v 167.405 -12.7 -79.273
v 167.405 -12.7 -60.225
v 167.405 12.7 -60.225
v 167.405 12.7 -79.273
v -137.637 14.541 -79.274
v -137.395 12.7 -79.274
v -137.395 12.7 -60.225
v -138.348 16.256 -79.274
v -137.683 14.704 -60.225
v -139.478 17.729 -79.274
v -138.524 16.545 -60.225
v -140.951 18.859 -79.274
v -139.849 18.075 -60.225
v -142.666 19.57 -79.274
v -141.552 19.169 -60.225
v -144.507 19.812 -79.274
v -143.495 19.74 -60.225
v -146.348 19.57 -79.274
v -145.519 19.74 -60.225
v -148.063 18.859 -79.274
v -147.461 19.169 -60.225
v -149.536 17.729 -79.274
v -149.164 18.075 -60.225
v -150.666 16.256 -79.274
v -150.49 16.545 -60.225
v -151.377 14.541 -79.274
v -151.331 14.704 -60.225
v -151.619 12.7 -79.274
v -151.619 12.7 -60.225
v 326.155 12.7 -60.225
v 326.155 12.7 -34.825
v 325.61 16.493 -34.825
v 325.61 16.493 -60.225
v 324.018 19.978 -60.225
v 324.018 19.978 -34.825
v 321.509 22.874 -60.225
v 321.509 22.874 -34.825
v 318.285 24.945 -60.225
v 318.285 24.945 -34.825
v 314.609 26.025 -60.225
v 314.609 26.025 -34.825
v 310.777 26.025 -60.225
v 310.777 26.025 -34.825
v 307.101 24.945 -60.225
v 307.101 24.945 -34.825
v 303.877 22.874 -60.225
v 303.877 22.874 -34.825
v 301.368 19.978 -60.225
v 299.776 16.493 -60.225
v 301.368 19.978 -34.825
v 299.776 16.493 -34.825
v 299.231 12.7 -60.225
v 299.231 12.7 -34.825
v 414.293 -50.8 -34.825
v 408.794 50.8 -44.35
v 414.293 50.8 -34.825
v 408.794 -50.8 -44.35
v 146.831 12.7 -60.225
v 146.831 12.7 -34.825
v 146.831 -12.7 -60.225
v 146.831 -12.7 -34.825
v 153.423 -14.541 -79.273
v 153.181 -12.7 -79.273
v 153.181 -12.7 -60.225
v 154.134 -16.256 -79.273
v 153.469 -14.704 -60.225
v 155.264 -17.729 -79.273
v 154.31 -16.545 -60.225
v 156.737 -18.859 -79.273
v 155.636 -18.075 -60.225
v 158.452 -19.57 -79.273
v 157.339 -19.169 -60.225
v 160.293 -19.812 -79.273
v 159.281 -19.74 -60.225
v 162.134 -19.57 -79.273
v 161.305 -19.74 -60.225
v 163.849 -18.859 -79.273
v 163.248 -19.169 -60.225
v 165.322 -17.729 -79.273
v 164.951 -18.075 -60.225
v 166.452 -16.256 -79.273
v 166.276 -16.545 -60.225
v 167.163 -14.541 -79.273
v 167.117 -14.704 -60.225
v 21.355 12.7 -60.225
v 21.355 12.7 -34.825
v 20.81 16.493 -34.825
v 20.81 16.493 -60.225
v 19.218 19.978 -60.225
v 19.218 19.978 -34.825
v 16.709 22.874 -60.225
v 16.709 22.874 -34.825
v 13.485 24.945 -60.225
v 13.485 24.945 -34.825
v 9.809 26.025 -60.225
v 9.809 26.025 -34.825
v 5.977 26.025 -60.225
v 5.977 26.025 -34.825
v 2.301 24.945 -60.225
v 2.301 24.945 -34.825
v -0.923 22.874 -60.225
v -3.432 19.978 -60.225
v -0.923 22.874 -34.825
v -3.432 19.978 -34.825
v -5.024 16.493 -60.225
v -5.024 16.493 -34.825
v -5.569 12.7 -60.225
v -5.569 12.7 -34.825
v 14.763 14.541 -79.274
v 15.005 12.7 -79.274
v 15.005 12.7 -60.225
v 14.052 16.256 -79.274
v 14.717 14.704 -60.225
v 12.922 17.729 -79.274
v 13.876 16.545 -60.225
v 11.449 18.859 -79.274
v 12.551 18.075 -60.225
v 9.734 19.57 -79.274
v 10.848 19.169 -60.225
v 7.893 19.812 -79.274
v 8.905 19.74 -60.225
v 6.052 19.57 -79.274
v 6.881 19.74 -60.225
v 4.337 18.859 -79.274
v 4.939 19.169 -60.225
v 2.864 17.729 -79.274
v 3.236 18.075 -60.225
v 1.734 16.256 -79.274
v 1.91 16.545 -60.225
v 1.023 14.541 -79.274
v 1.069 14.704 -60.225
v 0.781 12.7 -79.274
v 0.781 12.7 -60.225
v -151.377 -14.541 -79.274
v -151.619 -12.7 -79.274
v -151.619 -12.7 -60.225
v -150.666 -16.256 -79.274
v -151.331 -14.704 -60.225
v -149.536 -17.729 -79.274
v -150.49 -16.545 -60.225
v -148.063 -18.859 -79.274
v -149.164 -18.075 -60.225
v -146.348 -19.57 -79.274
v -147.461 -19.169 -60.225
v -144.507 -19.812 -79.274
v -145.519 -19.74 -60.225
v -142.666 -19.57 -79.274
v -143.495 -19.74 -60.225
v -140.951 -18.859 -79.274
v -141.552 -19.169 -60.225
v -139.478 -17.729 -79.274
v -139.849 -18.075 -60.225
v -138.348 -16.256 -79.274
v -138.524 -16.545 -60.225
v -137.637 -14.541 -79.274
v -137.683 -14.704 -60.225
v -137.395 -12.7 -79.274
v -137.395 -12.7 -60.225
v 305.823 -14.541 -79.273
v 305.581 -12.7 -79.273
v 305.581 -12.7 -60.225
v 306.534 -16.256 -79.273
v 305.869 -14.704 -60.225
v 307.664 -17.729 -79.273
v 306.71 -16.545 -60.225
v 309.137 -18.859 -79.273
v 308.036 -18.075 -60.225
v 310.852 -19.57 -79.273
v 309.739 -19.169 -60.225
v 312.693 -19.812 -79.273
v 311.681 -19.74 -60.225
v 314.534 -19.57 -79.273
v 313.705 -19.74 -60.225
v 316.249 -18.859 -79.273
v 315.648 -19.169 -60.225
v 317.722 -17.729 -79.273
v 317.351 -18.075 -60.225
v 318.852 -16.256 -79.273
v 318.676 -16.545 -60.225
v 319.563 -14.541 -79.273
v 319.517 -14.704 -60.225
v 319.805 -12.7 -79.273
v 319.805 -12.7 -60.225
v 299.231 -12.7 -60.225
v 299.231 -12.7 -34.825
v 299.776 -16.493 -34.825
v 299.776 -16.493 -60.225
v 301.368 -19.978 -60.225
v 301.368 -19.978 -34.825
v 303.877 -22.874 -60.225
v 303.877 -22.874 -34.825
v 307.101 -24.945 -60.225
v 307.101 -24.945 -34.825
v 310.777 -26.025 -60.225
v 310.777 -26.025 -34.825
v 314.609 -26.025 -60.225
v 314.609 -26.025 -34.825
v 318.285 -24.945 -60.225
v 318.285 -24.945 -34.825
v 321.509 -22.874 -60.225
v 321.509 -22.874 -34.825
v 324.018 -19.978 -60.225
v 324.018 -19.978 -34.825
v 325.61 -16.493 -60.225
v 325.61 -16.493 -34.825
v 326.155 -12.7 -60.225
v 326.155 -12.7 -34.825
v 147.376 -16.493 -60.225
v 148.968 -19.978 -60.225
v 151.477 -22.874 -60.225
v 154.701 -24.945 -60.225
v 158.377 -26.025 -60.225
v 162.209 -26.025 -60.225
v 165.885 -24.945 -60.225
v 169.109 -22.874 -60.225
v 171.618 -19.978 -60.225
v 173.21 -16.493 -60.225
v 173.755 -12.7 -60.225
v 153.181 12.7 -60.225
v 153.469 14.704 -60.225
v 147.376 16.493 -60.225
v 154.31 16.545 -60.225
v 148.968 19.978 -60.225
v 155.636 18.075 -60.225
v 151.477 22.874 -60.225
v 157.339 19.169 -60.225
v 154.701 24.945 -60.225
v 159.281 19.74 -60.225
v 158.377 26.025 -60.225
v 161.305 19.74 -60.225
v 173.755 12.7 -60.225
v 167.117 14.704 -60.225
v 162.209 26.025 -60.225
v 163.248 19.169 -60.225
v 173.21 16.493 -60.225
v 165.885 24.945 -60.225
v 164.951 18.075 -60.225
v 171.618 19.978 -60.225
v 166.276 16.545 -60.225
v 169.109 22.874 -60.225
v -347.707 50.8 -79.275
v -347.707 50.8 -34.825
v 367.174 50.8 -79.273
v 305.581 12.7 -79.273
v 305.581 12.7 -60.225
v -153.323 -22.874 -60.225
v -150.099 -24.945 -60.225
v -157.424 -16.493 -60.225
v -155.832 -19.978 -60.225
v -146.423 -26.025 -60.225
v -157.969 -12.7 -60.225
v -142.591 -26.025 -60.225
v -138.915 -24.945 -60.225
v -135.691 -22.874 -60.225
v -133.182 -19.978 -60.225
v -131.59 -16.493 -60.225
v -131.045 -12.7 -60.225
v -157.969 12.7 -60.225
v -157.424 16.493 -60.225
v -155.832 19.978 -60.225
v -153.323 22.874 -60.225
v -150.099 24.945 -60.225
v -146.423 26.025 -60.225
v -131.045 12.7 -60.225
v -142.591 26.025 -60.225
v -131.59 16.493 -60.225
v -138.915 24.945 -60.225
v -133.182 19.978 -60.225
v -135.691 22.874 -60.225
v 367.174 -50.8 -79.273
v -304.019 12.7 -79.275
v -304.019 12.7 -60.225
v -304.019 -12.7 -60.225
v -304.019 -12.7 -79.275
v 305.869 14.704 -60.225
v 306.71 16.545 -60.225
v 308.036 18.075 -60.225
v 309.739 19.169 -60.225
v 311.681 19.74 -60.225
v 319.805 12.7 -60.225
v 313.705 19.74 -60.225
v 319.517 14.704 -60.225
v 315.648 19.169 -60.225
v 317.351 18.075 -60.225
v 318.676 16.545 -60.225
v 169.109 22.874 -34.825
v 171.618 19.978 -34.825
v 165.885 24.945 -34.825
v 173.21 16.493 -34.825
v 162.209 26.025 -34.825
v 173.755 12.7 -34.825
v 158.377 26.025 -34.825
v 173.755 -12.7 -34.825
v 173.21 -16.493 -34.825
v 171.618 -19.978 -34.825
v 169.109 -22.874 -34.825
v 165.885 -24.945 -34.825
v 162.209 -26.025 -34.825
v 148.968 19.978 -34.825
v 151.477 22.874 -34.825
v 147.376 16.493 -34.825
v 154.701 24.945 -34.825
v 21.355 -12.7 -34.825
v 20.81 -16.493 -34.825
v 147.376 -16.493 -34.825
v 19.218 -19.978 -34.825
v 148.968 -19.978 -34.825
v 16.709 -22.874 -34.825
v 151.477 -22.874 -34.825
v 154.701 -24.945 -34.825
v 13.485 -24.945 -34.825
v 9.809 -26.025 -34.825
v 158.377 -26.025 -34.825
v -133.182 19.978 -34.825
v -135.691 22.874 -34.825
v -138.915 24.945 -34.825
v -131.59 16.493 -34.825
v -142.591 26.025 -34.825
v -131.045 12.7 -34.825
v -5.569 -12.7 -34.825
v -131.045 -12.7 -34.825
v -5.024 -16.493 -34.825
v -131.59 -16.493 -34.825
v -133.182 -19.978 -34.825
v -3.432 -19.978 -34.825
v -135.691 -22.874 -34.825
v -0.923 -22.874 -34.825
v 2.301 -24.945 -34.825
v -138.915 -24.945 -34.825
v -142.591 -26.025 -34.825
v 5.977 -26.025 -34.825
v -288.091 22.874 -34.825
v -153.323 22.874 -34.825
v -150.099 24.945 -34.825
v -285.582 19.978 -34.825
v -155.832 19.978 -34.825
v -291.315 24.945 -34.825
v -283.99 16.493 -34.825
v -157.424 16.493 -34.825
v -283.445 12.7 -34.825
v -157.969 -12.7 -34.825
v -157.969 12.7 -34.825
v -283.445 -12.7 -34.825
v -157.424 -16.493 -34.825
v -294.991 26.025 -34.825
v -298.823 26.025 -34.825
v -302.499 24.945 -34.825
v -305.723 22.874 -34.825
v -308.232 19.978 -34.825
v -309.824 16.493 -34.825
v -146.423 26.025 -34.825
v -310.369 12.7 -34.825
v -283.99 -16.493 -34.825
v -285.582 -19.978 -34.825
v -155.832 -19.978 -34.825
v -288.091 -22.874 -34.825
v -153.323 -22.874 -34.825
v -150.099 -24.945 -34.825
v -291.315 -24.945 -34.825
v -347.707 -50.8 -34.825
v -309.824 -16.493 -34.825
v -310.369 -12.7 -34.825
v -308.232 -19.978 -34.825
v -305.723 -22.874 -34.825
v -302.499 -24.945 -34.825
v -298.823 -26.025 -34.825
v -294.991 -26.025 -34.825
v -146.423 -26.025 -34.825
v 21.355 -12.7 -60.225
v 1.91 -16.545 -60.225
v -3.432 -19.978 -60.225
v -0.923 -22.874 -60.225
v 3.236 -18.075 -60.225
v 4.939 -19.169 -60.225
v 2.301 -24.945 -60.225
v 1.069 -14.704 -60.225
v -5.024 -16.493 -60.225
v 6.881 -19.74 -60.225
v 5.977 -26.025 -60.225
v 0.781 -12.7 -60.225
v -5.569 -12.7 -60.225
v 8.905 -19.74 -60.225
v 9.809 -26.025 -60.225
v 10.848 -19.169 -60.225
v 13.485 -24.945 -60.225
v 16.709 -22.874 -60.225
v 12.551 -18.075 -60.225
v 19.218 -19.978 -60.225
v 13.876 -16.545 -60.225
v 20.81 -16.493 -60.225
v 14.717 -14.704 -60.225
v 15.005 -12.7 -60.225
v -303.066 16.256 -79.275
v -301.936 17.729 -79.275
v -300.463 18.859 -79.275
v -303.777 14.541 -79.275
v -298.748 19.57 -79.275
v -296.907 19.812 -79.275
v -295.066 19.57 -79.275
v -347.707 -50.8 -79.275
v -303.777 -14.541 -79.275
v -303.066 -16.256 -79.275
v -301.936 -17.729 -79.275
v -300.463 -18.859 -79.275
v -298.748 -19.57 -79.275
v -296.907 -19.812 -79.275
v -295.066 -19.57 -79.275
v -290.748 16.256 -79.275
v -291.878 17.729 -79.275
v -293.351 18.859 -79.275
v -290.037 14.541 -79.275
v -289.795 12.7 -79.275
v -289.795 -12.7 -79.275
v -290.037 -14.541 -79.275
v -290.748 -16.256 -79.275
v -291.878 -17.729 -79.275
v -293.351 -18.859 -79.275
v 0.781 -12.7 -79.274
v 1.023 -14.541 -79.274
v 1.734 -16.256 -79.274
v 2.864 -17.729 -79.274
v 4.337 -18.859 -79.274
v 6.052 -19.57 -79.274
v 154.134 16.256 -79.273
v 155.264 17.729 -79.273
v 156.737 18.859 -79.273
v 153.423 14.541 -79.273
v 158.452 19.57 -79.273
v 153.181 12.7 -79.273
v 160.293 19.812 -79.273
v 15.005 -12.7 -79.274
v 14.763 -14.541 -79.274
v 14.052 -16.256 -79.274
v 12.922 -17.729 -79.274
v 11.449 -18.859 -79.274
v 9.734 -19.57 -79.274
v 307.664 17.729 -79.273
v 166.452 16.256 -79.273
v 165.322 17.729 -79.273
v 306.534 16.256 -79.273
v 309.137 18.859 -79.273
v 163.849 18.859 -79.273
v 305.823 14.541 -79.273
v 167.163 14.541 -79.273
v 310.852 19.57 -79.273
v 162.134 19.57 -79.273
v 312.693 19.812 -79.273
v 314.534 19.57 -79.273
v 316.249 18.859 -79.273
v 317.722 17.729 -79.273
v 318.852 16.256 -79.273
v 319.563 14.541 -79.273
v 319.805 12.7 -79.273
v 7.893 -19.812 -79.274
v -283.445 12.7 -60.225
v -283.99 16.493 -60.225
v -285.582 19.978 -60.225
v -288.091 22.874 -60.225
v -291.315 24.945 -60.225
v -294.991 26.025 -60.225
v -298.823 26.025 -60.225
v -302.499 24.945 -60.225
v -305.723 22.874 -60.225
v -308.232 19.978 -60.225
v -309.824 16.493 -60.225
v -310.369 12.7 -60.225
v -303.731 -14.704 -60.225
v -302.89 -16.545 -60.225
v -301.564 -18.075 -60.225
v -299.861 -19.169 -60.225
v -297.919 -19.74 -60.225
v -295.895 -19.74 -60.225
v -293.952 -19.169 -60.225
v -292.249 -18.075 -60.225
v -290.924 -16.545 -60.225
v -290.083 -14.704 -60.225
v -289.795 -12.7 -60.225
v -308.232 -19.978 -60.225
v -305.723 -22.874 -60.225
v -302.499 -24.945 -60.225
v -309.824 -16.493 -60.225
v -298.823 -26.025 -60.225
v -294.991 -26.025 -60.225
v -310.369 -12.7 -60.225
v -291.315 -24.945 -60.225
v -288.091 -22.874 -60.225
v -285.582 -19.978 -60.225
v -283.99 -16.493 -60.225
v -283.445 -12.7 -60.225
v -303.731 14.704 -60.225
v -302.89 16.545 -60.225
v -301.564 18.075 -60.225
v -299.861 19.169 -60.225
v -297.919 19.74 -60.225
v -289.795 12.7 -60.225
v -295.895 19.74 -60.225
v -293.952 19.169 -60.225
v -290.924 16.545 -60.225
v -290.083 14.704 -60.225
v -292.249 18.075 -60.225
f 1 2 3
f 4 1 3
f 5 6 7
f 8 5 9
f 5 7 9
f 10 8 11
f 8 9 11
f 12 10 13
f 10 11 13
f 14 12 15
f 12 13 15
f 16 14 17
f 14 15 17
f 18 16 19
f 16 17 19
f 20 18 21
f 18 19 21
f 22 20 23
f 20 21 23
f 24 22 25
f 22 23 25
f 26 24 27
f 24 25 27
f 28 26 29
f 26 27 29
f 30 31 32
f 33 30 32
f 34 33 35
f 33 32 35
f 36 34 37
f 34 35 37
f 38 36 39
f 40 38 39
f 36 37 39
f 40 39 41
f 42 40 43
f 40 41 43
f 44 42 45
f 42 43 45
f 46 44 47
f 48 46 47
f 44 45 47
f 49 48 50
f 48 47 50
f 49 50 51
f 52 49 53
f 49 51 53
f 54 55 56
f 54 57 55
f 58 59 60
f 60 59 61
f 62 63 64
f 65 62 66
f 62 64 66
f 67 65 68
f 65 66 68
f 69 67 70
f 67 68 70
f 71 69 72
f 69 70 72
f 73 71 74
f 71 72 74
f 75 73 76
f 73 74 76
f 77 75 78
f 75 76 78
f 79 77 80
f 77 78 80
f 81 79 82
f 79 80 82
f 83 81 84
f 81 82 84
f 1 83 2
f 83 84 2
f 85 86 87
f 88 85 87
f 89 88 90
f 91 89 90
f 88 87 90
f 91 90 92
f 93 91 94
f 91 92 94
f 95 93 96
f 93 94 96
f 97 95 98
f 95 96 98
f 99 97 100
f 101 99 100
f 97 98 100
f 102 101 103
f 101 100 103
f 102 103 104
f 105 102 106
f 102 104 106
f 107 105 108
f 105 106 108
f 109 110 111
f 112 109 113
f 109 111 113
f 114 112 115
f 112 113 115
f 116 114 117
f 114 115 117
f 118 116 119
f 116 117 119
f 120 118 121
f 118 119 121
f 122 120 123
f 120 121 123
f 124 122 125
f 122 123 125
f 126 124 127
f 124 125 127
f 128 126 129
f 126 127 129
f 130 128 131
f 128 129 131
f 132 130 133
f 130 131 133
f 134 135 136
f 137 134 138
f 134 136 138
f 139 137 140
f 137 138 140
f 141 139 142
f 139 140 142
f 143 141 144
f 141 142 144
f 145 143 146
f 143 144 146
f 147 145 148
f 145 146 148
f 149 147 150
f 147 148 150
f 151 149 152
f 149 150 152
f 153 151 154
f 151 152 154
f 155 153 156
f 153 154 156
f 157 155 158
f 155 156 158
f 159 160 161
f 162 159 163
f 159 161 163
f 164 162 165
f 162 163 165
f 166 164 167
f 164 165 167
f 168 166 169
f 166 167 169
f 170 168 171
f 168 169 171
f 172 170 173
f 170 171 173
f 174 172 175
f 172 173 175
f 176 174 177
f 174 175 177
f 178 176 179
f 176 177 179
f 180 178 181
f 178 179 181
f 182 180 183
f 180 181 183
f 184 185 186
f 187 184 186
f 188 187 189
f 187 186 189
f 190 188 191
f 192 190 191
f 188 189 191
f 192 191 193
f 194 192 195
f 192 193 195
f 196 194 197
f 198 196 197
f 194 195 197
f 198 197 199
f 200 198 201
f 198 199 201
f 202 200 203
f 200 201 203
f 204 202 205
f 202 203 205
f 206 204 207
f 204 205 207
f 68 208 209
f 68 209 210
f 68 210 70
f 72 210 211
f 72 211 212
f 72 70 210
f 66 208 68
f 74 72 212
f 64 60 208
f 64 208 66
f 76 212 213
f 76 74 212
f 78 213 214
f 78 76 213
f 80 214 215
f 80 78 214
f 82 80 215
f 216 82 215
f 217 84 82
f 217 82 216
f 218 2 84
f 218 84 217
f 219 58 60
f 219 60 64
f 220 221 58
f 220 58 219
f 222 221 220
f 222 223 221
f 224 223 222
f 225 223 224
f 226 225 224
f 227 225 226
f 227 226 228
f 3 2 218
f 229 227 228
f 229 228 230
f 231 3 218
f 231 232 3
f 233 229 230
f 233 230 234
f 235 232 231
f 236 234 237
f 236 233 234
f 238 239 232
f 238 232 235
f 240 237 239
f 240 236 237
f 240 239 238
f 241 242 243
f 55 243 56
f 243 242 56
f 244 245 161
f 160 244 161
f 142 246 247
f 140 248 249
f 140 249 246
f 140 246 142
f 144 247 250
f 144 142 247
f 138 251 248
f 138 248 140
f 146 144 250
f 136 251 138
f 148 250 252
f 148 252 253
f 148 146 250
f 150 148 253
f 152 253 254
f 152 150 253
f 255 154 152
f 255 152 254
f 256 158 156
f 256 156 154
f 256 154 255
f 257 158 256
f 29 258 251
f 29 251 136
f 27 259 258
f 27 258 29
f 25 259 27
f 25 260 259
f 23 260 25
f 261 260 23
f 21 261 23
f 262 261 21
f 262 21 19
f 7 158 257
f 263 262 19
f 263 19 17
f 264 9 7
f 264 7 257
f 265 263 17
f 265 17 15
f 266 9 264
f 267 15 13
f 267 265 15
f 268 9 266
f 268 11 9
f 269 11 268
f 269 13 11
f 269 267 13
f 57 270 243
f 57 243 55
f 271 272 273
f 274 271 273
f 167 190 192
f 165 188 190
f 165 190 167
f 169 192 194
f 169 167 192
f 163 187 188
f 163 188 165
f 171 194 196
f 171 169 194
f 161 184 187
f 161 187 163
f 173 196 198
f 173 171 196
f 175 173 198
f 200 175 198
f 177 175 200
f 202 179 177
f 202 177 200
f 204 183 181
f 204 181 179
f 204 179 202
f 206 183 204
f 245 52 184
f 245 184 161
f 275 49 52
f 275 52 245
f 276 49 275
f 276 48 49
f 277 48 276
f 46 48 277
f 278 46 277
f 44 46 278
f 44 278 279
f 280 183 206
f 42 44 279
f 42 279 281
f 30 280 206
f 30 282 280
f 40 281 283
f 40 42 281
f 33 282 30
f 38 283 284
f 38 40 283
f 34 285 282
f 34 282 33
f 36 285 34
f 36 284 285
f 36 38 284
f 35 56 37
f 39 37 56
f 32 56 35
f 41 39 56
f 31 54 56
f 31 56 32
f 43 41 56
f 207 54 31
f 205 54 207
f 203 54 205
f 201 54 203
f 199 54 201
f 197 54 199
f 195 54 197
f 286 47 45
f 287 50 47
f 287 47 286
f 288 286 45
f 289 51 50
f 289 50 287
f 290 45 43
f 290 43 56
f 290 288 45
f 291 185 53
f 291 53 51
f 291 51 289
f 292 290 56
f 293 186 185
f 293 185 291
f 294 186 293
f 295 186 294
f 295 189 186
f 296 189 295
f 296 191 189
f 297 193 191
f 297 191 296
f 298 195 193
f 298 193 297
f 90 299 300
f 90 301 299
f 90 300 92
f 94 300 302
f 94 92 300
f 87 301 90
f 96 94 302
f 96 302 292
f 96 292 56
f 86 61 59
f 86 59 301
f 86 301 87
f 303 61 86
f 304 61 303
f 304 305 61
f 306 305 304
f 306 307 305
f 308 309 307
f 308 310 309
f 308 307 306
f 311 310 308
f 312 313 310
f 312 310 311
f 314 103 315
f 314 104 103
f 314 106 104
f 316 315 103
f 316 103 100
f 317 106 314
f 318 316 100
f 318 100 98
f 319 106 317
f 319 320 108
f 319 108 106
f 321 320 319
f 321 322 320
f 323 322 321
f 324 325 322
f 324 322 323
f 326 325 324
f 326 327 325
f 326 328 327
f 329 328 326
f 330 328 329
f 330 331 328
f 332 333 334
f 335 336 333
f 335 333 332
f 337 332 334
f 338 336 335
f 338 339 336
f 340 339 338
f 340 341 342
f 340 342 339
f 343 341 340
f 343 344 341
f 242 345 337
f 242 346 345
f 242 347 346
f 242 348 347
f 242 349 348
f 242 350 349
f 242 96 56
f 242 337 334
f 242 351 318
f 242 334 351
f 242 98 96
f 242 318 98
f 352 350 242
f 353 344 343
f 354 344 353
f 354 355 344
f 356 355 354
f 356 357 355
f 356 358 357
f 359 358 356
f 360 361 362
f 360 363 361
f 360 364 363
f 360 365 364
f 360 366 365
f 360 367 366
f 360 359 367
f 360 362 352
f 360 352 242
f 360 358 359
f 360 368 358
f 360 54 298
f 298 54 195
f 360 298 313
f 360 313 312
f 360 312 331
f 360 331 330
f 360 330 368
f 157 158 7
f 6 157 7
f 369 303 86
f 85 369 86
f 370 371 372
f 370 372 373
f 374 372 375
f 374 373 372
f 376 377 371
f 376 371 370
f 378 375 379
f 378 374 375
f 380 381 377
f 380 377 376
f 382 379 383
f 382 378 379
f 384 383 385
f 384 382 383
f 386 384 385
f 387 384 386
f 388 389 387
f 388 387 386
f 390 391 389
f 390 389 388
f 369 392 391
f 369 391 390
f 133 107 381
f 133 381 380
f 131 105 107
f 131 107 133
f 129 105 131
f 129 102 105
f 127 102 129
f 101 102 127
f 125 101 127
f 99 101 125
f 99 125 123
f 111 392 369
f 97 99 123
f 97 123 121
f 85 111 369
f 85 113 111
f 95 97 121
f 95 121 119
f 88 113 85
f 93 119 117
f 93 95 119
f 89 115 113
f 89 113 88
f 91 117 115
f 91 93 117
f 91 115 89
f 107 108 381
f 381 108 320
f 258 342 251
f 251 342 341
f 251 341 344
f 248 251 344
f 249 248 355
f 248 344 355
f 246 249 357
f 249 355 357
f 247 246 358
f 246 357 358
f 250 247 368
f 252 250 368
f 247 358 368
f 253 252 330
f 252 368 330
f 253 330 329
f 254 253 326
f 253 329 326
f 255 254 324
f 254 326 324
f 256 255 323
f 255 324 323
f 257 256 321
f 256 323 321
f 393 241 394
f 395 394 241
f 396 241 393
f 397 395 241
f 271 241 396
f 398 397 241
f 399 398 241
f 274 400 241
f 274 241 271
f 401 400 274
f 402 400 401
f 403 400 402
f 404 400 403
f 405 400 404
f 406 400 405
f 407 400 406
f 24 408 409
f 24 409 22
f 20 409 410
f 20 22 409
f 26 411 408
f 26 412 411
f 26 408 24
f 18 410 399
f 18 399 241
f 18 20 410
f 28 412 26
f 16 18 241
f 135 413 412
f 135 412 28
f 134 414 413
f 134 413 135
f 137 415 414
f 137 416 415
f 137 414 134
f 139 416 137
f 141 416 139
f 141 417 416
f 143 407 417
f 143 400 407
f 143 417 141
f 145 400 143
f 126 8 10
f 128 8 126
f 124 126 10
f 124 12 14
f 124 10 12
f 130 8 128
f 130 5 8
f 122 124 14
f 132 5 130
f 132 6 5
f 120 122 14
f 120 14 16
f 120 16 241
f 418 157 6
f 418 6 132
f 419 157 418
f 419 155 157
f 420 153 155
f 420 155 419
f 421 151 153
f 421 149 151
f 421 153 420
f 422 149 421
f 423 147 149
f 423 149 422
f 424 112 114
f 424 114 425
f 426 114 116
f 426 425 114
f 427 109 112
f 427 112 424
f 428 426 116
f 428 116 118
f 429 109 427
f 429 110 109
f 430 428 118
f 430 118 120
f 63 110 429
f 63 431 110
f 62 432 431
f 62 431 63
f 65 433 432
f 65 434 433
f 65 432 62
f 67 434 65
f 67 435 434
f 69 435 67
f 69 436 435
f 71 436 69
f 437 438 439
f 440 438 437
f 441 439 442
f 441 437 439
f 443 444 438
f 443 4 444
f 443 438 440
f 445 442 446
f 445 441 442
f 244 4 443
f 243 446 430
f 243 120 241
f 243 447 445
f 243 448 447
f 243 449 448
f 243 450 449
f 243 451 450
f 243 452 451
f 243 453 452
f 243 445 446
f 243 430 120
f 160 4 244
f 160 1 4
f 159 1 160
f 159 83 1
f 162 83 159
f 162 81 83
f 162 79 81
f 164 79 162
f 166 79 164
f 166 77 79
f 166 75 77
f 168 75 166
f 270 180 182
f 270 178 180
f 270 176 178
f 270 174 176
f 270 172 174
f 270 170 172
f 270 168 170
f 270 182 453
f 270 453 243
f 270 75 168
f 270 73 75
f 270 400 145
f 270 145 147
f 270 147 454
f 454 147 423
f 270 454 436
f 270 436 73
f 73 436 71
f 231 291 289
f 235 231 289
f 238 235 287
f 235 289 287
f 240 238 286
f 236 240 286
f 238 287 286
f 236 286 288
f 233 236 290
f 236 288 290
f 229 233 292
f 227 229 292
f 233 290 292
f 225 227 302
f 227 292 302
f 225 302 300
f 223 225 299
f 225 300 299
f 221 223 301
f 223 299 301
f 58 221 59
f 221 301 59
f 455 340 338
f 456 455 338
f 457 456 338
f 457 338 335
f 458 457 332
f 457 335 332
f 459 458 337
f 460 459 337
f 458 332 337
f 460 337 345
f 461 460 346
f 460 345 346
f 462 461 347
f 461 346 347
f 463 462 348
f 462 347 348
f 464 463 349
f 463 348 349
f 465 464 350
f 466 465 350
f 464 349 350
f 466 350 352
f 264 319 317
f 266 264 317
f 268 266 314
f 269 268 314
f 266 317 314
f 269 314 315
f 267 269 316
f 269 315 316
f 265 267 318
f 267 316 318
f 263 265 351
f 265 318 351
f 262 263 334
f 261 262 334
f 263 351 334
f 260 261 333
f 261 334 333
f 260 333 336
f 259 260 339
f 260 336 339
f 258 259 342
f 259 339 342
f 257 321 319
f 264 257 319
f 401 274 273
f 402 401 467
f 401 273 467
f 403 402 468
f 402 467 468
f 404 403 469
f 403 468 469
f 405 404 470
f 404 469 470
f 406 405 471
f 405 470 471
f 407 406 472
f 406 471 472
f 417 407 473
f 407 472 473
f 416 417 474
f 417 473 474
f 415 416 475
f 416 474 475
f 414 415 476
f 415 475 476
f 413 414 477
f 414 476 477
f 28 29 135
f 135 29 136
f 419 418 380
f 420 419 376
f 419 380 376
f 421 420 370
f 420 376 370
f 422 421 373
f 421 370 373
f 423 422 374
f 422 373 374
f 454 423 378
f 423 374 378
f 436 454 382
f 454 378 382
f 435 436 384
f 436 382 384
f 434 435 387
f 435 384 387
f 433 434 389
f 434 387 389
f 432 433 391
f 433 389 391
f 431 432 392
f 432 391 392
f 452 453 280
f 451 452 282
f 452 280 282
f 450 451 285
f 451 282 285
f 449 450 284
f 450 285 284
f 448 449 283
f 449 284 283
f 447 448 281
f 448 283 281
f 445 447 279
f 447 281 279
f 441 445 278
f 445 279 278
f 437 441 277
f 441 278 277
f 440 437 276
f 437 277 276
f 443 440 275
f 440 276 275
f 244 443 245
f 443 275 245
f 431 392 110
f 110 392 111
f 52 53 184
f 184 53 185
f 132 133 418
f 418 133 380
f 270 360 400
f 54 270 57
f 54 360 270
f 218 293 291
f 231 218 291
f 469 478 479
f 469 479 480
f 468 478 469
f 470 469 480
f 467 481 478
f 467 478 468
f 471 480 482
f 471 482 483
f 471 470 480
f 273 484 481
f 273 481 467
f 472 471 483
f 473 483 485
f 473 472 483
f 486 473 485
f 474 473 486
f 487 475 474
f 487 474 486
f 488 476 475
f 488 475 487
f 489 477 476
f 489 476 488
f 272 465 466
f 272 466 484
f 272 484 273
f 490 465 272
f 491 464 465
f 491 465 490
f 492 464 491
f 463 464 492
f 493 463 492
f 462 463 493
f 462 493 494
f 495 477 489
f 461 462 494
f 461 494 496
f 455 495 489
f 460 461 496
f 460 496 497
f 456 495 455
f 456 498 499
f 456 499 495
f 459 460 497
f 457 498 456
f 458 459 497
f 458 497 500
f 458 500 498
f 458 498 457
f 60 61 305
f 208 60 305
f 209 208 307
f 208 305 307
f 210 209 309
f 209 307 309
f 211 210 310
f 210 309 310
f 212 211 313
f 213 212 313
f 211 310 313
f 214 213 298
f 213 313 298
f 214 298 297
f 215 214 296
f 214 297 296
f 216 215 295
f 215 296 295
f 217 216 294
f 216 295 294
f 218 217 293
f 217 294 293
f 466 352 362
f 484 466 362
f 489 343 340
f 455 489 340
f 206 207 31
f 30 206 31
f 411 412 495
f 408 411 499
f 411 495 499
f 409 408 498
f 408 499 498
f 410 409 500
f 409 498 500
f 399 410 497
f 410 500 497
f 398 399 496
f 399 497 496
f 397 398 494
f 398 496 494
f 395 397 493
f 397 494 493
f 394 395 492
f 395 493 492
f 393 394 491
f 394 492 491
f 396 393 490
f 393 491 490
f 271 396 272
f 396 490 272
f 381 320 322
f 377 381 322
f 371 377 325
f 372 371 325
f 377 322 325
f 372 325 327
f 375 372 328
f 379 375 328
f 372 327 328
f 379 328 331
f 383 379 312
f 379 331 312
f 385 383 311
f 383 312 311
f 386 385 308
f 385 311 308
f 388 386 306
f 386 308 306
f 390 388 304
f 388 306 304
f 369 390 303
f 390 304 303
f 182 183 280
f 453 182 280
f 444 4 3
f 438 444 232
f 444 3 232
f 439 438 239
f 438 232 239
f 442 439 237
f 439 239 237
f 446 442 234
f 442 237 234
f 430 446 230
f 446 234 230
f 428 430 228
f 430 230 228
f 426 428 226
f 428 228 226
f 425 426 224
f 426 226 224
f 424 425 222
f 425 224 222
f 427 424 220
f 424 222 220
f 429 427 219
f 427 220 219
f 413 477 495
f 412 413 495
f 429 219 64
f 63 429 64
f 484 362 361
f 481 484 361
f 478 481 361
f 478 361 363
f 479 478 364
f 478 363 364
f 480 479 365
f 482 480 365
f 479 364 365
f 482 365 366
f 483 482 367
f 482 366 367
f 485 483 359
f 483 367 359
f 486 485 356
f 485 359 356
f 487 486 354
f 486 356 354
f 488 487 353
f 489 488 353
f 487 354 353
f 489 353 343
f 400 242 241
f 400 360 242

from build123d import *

# Parameters (mm, degrees)
F1_DEPTH = 50.8
F3_DEPTH = 44.451
F4_DEPTH = 25.4


# Not quite as in the source:
# - ends of sketch curves that miss each other by under 0.0002 mm in the source are joined


with BuildPart() as f1:
    # F0 (on Front) → F1 (new body, symmetric)
    with BuildSketch(Plane.XZ):
        Polygon((-347.7068640215, -34.8248227949), (-347.7068640215, -79.2748227949), (367.1742644244, -79.272822397), (408.7938746644, -44.3498227949), (414.2931359785, -34.8248227949), align=None)
    extrude(amount=F1_DEPTH, both=True)

    # F2 (on face) → F3 (cut, through all)
    with BuildSketch(Plane.XY.offset(-34.8248227949)):
        with BuildLine():
            ThreePointArc((-304.0188640215, -12.7), (-296.9068640215, -19.812), (-289.7948640215, -12.7))
            Line((-289.7948640215, -12.7), (-289.7948640215, 12.7))
            ThreePointArc((-289.7948640215, 12.7), (-296.9068640215, 19.812), (-304.0188640215, 12.7))
            Line((-304.0188640215, 12.7), (-304.0188640215, -12.7))
        make_face()
        with BuildLine():
            ThreePointArc((-151.6188640215, -12.7), (-144.5068640215, -19.812), (-137.3948640215, -12.7))
            Line((-137.3948640215, -12.7), (-137.3948640215, 12.7))
            ThreePointArc((-137.3948640215, 12.7), (-144.5068640215, 19.812), (-151.6188640215, 12.7))
            Line((-151.6188640215, 12.7), (-151.6188640215, -12.7))
        make_face()
        with BuildLine():
            ThreePointArc((0.7811359785, -12.7), (7.8931359785, -19.812), (15.0051359785, -12.7))
            Line((15.0051359785, -12.7), (15.0051359785, 12.7))
            ThreePointArc((15.0051359785, 12.7), (7.8931359785, 19.812), (0.7811359785, 12.7))
            Line((0.7811359785, 12.7), (0.7811359785, -12.7))
        make_face()
        with BuildLine():
            ThreePointArc((153.1811359785, -12.7), (160.2931359785, -19.812), (167.4051359785, -12.7))
            Line((167.4051359785, -12.7), (167.4051359785, 12.7))
            ThreePointArc((167.4051359785, 12.7), (160.2931359785, 19.812), (153.1811359785, 12.7))
            Line((153.1811359785, 12.7), (153.1811359785, -12.7))
        make_face()
        with BuildLine():
            ThreePointArc((305.5811359785, -12.7), (312.6931359785, -19.812), (319.8051359785, -12.7))
            Line((319.8051359785, -12.7), (319.8051359785, 12.7))
            ThreePointArc((319.8051359785, 12.7), (312.6931359785, 19.812), (305.5811359785, 12.7))
            Line((305.5811359785, 12.7), (305.5811359785, -12.7))
        make_face()
    extrude(amount=-F3_DEPTH, mode=Mode.SUBTRACT)

    # F2 (on face) → F4 (cut)
    with BuildSketch(Plane.XY.offset(-34.8248227949)):
        with BuildLine():
            ThreePointArc((-283.4448517417, 12.7), (-296.9068640215, 26.1620122798), (-310.3688763013, 12.7))
            Line((-310.3688763013, 12.7), (-310.3688640215, -12.7))
            ThreePointArc((-310.3688640215, -12.7), (-296.9068640215, -26.162), (-283.4448640215, -12.7))
            Line((-283.4448640215, -12.7), (-283.4448517417, 12.7))
        make_face()
        with BuildLine():
            Line((-289.7948640215, 12.7), (-289.7948640215, -12.7))
            ThreePointArc((-289.7948640215, -12.7), (-296.9068640215, -19.812), (-304.0188640215, -12.7))
            Line((-304.0188640215, -12.7), (-304.0188640215, 12.7))
            ThreePointArc((-304.0188640215, 12.7), (-296.9068640215, 19.812), (-289.7948640215, 12.7))
        make_face(mode=Mode.SUBTRACT)
        with BuildLine():
            Line((-157.9688640215, 12.7), (-157.9688640215, -12.7))
            ThreePointArc((-157.9688640215, -12.7), (-144.5068640215, -26.162), (-131.0448640215, -12.7))
            Line((-131.0448640215, -12.7), (-131.0448516369, 12.7))
            ThreePointArc((-131.0448516369, 12.7), (-144.5068640215, 26.1620122798), (-157.9688640215, 12.7))
        make_face()
        with BuildLine():
            Line((-137.3948640215, 12.7), (-137.3948640215, -12.7))
            ThreePointArc((-137.3948640215, -12.7), (-144.5068640215, -19.812), (-151.6188640215, -12.7))
            Line((-151.6188640215, -12.7), (-151.6188640215, 12.7))
            ThreePointArc((-151.6188640215, 12.7), (-144.5068640215, 19.812), (-137.3948640215, 12.7))
        make_face(mode=Mode.SUBTRACT)
        with BuildLine():
            Line((-5.5688640215, 12.7), (-5.5688640215, -12.7))
            ThreePointArc((-5.5688640215, -12.7), (7.8931359785, -26.162), (21.3551359785, -12.7))
            Line((21.3551359785, -12.7), (21.3551483631, 12.7))
            ThreePointArc((21.3551483631, 12.7), (7.8931359785, 26.1620122798), (-5.5688640215, 12.7))
        make_face()
        with BuildLine():
            Line((15.0051359785, 12.7), (15.0051359785, -12.7))
            ThreePointArc((15.0051359785, -12.7), (7.8931359785, -19.812), (0.7811359785, -12.7))
            Line((0.7811359785, -12.7), (0.7811359785, 12.7))
            ThreePointArc((0.7811359785, 12.7), (7.8931359785, 19.812), (15.0051359785, 12.7))
        make_face(mode=Mode.SUBTRACT)
        with BuildLine():
            Line((146.8311359785, 12.7), (146.8311359785, -12.7))
            ThreePointArc((146.8311359785, -12.7), (160.2931359785, -26.162), (173.7551359785, -12.7))
            Line((173.7551359785, -12.7), (173.7551483631, 12.7))
            ThreePointArc((173.7551483631, 12.7), (160.2931359785, 26.1620122798), (146.8311359785, 12.7))
        make_face()
        with BuildLine():
            Line((167.4051359785, 12.7), (167.4051359785, -12.7))
            ThreePointArc((167.4051359785, -12.7), (160.2931359785, -19.812), (153.1811359785, -12.7))
            Line((153.1811359785, -12.7), (153.1811359785, 12.7))
            ThreePointArc((153.1811359785, 12.7), (160.2931359785, 19.812), (167.4051359785, 12.7))
        make_face(mode=Mode.SUBTRACT)
        with BuildLine():
            Line((299.2311359785, 12.7), (299.2311359785, -12.7))
            ThreePointArc((299.2311359785, -12.7), (312.6931359785, -26.162), (326.1551359785, -12.7))
            Line((326.1551359785, -12.7), (326.1551483631, 12.7))
            ThreePointArc((326.1551483631, 12.7), (312.6931359785, 26.1620122798), (299.2311359785, 12.7))
        make_face()
        with BuildLine():
            Line((319.8051359785, 12.7), (319.8051359785, -12.7))
            ThreePointArc((319.8051359785, -12.7), (312.6931359785, -19.812), (305.5811359785, -12.7))
            Line((305.5811359785, -12.7), (305.5811359785, 12.7))
            ThreePointArc((305.5811359785, 12.7), (312.6931359785, 19.812), (319.8051359785, 12.7))
        make_face(mode=Mode.SUBTRACT)
    extrude(amount=-F4_DEPTH, mode=Mode.SUBTRACT)


solid = f1.part
